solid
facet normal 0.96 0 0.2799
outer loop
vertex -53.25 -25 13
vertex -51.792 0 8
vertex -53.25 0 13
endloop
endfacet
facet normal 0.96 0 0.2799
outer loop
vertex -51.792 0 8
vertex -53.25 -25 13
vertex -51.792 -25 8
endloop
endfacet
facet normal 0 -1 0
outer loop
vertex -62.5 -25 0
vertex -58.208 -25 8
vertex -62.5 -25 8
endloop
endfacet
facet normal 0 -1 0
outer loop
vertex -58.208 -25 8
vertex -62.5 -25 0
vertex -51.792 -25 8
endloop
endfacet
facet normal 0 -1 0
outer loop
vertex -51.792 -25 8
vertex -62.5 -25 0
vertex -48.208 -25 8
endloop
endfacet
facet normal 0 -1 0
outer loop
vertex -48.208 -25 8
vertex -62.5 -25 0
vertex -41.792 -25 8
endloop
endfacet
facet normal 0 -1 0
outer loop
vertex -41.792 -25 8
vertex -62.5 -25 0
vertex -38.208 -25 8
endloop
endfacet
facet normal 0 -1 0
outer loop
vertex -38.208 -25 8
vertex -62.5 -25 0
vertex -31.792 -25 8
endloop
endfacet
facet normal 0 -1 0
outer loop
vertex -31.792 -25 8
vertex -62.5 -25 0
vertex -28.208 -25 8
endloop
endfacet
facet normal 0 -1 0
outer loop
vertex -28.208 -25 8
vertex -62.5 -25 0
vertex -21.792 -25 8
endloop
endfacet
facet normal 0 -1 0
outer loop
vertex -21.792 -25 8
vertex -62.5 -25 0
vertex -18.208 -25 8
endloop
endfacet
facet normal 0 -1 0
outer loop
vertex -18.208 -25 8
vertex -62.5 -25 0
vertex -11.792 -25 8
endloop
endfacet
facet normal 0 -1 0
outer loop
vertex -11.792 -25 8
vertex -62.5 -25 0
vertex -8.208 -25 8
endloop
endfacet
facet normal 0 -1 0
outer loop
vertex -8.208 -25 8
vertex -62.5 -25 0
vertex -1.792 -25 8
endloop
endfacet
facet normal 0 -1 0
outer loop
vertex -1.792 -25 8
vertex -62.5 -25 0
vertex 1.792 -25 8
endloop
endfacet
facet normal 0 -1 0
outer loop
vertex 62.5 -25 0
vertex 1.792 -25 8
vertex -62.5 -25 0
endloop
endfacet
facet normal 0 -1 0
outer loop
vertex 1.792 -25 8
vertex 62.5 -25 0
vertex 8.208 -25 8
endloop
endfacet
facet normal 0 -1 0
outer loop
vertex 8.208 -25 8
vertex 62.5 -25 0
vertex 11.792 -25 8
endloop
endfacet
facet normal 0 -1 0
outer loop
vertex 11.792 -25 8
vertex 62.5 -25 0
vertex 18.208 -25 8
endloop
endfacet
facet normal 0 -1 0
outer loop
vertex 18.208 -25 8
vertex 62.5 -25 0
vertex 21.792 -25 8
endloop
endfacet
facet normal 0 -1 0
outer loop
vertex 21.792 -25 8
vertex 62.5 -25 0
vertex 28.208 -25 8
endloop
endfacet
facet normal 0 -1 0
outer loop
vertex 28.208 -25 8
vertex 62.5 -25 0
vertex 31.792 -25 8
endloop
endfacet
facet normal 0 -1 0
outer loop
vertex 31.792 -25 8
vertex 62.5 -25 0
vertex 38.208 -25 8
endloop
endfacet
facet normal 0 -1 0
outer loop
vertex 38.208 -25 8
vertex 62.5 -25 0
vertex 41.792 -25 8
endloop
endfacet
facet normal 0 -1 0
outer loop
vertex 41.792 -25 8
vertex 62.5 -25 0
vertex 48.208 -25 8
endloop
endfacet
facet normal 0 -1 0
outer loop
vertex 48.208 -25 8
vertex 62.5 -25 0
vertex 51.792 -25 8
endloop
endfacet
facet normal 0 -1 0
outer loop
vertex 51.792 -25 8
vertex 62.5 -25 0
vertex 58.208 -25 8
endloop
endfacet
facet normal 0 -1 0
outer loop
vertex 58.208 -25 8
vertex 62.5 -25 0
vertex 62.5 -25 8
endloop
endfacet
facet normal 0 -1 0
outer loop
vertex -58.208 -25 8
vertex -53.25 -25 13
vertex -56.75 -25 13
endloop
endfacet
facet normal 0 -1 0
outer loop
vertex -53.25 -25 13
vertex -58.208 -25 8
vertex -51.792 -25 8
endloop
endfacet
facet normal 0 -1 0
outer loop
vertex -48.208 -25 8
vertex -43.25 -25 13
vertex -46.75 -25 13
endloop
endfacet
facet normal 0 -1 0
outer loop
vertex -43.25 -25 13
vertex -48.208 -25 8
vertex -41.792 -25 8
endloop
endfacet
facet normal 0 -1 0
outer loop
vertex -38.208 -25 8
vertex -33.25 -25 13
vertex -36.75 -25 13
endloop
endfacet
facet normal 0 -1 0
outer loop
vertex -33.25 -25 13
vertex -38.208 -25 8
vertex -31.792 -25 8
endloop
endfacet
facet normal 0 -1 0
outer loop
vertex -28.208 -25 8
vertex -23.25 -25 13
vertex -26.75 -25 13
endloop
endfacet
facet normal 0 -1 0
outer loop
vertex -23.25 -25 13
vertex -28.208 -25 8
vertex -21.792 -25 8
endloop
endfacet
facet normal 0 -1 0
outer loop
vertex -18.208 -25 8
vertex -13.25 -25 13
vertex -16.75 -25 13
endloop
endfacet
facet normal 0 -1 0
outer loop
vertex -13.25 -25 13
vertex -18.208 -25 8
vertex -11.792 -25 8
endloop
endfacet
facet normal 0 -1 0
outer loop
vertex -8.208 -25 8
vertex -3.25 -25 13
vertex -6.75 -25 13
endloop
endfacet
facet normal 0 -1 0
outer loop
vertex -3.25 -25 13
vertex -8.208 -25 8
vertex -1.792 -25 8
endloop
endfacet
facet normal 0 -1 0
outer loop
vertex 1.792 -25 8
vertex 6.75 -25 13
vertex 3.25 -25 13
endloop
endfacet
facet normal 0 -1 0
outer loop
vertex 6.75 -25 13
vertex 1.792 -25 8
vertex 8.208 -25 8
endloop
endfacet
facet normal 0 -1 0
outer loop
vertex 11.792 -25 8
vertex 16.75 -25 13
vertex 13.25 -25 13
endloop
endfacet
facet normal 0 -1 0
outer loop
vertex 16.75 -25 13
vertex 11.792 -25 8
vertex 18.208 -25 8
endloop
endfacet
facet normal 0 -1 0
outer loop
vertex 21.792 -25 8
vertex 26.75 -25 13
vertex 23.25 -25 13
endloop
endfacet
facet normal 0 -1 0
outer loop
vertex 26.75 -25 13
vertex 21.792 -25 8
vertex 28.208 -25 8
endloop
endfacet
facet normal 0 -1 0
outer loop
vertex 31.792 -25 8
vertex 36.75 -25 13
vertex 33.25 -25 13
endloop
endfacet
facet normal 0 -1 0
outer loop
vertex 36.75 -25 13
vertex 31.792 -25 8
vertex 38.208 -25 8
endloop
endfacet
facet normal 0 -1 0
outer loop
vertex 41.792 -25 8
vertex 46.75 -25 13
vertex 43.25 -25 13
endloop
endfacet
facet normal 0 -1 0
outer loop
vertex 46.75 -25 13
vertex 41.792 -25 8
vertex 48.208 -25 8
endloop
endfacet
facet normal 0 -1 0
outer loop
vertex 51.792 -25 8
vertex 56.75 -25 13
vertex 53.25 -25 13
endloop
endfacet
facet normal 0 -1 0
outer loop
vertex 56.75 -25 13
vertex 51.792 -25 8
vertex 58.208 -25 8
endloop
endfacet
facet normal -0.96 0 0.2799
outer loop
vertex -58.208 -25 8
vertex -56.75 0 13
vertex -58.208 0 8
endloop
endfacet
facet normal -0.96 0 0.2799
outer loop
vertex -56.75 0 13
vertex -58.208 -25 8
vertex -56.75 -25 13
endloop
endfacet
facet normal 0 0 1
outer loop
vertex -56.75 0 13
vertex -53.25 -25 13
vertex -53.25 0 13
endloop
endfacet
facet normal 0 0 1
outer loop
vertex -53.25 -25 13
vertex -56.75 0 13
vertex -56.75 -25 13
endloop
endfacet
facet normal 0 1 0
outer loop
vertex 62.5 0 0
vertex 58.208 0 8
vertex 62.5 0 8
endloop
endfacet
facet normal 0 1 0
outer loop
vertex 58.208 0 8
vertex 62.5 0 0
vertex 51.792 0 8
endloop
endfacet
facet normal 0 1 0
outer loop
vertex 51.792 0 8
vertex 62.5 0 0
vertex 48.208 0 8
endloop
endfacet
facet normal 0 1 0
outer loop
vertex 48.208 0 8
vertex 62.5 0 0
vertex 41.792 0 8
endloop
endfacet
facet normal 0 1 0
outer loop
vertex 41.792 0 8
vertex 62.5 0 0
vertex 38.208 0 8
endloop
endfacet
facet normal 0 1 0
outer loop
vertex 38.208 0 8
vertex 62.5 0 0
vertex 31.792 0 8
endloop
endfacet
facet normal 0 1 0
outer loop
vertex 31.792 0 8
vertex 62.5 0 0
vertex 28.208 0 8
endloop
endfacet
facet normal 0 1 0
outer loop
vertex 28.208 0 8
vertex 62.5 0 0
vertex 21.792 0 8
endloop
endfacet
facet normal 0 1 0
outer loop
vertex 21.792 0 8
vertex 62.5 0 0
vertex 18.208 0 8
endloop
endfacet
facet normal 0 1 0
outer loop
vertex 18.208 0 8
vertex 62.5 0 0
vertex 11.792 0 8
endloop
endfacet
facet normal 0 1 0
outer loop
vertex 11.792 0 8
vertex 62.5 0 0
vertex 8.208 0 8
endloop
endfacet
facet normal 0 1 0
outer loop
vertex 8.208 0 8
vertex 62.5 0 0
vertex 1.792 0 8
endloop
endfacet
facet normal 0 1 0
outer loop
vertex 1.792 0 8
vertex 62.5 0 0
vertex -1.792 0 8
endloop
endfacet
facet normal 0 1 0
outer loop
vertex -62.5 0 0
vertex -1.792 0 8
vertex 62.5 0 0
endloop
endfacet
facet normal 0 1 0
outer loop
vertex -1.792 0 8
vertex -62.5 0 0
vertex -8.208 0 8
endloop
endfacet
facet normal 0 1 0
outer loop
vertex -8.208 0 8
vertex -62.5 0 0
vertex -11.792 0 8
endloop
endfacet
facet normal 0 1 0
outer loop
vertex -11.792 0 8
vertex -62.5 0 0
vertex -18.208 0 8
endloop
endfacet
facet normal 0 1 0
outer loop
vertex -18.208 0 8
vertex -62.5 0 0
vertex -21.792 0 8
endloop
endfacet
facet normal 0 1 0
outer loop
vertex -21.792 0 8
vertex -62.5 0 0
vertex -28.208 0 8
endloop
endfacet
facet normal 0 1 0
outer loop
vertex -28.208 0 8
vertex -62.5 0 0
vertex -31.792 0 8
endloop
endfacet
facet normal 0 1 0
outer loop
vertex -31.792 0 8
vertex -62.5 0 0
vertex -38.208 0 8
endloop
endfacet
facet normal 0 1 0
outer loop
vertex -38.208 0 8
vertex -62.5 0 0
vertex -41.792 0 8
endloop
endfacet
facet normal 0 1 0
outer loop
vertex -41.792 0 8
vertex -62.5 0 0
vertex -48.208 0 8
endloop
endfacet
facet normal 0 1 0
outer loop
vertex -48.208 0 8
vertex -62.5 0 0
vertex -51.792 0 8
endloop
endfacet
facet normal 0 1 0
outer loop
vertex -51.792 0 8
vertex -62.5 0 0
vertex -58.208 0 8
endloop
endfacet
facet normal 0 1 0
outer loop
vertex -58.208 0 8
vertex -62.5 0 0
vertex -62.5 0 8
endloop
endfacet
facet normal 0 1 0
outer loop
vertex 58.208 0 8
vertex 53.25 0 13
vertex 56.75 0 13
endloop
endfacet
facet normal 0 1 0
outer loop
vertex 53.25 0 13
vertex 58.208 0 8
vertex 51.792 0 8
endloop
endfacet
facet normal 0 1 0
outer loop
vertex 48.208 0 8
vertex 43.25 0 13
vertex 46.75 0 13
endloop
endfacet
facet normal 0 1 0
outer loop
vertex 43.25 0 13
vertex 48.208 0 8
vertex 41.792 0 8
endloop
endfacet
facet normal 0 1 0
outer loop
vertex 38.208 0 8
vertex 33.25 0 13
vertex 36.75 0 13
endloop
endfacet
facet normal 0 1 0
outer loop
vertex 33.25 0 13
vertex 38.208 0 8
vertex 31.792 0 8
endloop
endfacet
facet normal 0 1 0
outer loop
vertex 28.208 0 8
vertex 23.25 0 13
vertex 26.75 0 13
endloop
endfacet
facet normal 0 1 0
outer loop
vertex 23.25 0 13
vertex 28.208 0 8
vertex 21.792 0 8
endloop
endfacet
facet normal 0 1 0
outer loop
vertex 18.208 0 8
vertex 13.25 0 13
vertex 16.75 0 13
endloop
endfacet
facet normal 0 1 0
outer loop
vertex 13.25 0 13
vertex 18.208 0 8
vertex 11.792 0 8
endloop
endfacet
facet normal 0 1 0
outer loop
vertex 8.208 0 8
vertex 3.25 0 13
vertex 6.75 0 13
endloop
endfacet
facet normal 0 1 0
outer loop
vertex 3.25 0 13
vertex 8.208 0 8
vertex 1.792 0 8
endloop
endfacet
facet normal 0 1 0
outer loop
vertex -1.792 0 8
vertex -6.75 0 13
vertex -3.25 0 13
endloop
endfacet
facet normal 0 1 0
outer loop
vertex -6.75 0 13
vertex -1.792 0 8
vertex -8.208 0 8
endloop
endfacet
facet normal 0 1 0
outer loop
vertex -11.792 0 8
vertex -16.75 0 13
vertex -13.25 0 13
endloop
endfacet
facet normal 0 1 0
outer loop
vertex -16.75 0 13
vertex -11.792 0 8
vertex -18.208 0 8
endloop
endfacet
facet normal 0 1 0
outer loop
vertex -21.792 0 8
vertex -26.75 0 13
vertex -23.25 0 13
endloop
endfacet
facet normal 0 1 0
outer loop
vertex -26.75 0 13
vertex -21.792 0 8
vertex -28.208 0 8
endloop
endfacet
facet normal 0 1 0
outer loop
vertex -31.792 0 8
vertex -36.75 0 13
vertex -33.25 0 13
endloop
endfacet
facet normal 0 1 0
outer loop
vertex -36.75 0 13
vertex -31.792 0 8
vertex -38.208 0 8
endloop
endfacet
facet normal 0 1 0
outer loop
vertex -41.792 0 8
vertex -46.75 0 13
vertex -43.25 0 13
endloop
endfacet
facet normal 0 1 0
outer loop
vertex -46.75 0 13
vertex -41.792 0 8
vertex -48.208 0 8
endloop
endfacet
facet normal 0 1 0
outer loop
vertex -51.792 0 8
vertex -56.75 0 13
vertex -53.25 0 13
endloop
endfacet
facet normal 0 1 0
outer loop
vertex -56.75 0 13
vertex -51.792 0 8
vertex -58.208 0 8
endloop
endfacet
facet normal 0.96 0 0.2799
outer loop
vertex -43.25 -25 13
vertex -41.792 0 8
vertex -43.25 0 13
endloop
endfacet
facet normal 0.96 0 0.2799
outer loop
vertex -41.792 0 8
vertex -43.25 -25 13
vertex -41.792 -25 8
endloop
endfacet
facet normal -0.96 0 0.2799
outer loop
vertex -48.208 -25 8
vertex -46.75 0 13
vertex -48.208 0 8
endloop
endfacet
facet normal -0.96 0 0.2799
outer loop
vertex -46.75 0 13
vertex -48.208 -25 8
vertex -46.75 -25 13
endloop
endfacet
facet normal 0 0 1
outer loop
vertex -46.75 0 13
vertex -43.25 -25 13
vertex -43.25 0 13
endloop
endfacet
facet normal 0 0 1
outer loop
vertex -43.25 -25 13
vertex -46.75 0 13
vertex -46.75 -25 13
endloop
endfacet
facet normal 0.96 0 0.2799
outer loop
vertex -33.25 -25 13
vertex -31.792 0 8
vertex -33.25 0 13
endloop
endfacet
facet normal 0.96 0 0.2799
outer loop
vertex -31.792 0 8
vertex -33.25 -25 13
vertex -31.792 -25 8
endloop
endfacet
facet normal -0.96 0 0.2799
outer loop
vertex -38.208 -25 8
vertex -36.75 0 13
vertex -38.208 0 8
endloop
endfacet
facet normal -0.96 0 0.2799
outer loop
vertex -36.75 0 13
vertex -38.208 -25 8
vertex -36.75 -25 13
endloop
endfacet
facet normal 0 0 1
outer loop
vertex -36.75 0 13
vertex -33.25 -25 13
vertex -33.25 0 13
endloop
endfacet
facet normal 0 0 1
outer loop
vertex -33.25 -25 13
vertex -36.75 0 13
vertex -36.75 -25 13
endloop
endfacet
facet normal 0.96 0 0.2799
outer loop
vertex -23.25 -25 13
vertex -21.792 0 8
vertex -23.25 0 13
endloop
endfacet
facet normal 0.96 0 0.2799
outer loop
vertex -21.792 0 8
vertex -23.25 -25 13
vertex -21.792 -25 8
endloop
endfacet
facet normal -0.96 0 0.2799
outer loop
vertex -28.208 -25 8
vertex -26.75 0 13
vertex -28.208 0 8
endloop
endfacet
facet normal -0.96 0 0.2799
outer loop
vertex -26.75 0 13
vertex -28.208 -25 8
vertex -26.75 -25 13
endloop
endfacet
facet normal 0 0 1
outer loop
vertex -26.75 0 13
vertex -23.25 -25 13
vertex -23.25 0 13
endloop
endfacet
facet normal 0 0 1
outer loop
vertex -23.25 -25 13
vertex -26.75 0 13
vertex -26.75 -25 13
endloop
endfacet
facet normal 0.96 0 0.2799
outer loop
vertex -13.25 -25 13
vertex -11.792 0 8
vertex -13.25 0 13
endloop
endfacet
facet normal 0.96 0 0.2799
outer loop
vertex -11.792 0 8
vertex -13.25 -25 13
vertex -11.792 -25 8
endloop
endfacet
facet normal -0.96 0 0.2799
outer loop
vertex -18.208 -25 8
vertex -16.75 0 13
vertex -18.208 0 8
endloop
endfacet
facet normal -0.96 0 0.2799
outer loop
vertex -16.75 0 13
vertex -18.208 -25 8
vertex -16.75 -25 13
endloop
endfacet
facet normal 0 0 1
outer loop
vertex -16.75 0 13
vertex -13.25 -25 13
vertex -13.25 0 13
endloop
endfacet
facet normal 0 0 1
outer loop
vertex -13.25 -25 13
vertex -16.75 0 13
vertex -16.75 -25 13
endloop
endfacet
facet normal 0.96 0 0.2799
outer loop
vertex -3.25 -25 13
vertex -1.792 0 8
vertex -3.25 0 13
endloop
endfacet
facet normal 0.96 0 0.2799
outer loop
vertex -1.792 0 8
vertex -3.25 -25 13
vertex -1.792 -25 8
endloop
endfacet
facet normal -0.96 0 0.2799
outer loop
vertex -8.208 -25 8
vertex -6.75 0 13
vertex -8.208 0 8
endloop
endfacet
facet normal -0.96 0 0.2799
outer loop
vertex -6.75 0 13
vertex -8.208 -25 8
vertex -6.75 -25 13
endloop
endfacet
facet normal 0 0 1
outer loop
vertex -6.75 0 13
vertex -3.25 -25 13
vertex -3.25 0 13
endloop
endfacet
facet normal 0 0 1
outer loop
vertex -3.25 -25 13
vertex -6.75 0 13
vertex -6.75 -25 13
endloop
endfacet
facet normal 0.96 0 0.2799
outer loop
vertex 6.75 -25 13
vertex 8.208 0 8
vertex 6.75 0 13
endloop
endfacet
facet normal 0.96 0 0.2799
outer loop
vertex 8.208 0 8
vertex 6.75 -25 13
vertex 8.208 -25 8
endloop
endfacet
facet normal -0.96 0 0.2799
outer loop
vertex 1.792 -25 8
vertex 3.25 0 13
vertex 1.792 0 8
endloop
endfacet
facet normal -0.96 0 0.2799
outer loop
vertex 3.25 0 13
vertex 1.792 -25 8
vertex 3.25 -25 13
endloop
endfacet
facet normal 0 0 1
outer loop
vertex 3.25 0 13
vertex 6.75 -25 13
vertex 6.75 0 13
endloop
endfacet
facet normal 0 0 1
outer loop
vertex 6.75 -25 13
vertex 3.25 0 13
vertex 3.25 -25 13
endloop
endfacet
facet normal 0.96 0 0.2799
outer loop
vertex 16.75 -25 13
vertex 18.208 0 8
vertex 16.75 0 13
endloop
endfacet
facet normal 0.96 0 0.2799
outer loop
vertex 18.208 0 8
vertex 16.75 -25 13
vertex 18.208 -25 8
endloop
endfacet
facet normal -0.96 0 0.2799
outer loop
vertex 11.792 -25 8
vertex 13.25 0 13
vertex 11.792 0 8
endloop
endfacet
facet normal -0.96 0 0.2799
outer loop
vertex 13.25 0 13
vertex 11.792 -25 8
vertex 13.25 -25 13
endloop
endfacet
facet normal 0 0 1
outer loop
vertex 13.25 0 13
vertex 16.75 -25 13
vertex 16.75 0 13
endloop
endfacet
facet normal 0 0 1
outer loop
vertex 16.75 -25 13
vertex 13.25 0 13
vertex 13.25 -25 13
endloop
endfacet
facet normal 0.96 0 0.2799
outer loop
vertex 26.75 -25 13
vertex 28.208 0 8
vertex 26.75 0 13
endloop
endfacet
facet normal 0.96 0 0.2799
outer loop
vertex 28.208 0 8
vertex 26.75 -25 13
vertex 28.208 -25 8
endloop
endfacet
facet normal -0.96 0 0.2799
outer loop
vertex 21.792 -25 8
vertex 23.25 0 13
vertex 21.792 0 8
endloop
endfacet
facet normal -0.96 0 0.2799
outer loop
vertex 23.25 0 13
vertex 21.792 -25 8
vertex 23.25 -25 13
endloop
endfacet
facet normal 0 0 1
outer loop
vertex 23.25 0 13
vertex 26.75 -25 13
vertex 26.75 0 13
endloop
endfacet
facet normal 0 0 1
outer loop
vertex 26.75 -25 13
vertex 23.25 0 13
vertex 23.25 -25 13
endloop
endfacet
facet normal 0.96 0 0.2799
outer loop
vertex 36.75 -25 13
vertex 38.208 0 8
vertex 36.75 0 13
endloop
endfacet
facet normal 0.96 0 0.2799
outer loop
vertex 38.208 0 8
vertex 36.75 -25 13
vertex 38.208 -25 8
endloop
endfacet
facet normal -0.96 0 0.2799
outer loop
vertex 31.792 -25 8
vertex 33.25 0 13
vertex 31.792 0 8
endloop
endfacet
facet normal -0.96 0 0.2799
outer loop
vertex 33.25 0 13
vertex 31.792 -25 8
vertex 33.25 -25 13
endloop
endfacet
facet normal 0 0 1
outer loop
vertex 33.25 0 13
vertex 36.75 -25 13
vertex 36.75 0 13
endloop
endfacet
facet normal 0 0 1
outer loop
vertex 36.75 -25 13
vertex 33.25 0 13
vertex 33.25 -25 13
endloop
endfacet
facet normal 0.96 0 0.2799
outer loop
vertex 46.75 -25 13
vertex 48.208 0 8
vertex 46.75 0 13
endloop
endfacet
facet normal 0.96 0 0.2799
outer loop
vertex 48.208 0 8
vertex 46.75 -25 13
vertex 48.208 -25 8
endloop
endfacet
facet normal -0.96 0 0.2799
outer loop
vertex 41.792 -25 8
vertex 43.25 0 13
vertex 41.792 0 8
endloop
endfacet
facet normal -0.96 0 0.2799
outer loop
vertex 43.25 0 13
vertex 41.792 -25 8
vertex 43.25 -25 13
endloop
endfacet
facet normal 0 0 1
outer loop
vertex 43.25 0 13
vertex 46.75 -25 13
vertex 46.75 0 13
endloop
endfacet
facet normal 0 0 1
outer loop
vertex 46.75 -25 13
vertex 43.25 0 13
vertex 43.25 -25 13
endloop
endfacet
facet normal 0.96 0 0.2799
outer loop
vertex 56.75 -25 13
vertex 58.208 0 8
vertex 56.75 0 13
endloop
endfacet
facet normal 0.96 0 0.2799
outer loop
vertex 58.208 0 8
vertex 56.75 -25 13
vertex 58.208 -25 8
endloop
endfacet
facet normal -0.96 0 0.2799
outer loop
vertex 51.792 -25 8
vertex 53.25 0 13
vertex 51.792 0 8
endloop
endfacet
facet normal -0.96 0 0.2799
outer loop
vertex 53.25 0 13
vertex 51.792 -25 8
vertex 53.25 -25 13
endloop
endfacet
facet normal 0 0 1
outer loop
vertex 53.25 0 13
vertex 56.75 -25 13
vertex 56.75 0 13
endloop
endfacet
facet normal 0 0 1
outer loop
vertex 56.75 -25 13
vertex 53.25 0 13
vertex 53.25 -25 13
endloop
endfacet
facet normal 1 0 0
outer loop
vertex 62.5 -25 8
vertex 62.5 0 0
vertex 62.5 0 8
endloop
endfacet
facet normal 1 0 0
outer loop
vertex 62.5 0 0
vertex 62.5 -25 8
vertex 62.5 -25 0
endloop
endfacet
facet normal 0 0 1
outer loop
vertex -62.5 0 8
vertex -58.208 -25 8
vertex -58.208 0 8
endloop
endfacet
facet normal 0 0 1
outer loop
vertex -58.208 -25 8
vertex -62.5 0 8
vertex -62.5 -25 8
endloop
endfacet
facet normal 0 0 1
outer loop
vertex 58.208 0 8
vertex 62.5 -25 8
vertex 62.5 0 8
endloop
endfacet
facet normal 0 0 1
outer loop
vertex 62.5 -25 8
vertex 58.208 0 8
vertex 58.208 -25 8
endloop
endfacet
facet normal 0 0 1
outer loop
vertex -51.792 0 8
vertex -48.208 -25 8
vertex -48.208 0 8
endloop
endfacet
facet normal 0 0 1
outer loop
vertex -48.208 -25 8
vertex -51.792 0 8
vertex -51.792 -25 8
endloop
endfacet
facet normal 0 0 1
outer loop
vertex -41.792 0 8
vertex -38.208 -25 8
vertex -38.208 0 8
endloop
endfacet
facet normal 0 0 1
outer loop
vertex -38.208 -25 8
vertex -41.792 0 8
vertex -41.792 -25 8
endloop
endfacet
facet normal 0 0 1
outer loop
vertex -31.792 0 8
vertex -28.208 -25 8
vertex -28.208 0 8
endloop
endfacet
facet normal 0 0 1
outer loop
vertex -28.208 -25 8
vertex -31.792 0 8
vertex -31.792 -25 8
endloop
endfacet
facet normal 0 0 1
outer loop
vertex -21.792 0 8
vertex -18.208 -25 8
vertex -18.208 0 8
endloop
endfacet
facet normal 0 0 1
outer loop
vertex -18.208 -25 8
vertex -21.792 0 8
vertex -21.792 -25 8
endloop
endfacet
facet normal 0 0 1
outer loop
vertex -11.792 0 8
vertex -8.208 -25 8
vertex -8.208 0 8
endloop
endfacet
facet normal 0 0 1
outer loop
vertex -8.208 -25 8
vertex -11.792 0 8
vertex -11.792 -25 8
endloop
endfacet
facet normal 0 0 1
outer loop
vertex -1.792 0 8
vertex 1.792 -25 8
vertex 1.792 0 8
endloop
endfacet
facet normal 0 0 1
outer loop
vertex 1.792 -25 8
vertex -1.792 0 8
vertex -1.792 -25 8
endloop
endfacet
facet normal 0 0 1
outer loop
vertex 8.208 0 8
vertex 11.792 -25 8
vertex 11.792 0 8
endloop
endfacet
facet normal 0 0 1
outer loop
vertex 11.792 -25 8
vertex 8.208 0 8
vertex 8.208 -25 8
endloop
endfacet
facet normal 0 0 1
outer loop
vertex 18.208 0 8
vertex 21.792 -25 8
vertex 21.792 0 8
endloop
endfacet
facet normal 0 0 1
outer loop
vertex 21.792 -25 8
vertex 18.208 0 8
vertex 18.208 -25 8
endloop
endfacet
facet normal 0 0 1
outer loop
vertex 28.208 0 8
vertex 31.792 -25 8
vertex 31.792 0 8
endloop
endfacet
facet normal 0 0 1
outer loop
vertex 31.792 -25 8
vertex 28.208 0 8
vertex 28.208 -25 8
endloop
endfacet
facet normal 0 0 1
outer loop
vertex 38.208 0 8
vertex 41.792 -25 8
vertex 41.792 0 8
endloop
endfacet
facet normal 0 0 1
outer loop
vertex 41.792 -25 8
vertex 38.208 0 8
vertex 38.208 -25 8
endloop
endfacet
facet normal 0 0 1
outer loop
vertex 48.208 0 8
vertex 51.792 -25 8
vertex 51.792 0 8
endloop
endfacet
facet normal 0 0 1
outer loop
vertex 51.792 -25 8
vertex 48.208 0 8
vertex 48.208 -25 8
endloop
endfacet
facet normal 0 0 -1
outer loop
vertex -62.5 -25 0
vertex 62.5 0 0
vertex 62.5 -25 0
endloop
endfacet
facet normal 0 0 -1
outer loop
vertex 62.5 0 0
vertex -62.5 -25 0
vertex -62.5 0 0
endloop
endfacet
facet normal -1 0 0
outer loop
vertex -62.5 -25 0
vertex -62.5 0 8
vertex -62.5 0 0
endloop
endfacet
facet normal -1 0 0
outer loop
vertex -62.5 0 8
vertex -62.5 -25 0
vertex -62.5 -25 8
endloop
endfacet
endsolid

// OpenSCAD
$fn = 32;

// ----------------------------------------------------------------------
// Toothed rack, 12 teeth
// 10 mm pitch, 5 mm teeth
// ----------------------------------------------------------------------

// --- parameters (mm) ---
bar_w = 25;     // bar width (Y)
bar_h = 8;      // bar height (Z)
teeth = 12;     // number of teeth
pitch = 10;     // tooth pitch
tooth_h = 5;    // tooth height above the bar
root_w = 7;     // tooth width at the root
crest_w = 3.5;  // tooth width at the crest

// --- derived feature positions (mm) ---
span = (teeth - 1) * pitch;  // = 110   distance between the outer teeth
bar_l = span + root_w + 8;   // = 125   bar length: teeth plus 4 mm at each end
tooth_x = -span / 2;         // = -55   X of the first tooth
height = bar_h + tooth_h;    // = 13   overall height
feature_centers = [
  [tooth_x + 0 * pitch, -bar_w / 2],
  [tooth_x + 1 * pitch, -bar_w / 2],
  [tooth_x + 2 * pitch, -bar_w / 2],
  [tooth_x + 3 * pitch, -bar_w / 2],
  [tooth_x + 4 * pitch, -bar_w / 2],
  [tooth_x + 5 * pitch, -bar_w / 2],
  [tooth_x + 6 * pitch, -bar_w / 2],
  [tooth_x + 7 * pitch, -bar_w / 2],
  [tooth_x + 8 * pitch, -bar_w / 2],
  [tooth_x + 9 * pitch, -bar_w / 2],
  [tooth_x + 10 * pitch, -bar_w / 2],
  [tooth_x + 11 * pitch, -bar_w / 2]
];   // tooth centre line, drives the tooth loop

// bar with a rack of teeth, one extruded trapezoium per centre
module rack_tooth() {
  linear_extrude(height = bar_w)
    polygon(points = [
      [0, 0],
      [root_w, 0],
      [root_w / 2 + crest_w / 2, tooth_h + 1],
      [root_w / 2 - crest_w / 2, tooth_h + 1]
    ]);
}

union() {
  translate([-bar_l / 2, -bar_w, 0]) cube([bar_l, bar_w, bar_h]);
  for (centre = feature_centers)
    translate([centre[0] - root_w / 2, 0, bar_h - 1]) rotate([90, 0, 0]) rack_tooth();
}
